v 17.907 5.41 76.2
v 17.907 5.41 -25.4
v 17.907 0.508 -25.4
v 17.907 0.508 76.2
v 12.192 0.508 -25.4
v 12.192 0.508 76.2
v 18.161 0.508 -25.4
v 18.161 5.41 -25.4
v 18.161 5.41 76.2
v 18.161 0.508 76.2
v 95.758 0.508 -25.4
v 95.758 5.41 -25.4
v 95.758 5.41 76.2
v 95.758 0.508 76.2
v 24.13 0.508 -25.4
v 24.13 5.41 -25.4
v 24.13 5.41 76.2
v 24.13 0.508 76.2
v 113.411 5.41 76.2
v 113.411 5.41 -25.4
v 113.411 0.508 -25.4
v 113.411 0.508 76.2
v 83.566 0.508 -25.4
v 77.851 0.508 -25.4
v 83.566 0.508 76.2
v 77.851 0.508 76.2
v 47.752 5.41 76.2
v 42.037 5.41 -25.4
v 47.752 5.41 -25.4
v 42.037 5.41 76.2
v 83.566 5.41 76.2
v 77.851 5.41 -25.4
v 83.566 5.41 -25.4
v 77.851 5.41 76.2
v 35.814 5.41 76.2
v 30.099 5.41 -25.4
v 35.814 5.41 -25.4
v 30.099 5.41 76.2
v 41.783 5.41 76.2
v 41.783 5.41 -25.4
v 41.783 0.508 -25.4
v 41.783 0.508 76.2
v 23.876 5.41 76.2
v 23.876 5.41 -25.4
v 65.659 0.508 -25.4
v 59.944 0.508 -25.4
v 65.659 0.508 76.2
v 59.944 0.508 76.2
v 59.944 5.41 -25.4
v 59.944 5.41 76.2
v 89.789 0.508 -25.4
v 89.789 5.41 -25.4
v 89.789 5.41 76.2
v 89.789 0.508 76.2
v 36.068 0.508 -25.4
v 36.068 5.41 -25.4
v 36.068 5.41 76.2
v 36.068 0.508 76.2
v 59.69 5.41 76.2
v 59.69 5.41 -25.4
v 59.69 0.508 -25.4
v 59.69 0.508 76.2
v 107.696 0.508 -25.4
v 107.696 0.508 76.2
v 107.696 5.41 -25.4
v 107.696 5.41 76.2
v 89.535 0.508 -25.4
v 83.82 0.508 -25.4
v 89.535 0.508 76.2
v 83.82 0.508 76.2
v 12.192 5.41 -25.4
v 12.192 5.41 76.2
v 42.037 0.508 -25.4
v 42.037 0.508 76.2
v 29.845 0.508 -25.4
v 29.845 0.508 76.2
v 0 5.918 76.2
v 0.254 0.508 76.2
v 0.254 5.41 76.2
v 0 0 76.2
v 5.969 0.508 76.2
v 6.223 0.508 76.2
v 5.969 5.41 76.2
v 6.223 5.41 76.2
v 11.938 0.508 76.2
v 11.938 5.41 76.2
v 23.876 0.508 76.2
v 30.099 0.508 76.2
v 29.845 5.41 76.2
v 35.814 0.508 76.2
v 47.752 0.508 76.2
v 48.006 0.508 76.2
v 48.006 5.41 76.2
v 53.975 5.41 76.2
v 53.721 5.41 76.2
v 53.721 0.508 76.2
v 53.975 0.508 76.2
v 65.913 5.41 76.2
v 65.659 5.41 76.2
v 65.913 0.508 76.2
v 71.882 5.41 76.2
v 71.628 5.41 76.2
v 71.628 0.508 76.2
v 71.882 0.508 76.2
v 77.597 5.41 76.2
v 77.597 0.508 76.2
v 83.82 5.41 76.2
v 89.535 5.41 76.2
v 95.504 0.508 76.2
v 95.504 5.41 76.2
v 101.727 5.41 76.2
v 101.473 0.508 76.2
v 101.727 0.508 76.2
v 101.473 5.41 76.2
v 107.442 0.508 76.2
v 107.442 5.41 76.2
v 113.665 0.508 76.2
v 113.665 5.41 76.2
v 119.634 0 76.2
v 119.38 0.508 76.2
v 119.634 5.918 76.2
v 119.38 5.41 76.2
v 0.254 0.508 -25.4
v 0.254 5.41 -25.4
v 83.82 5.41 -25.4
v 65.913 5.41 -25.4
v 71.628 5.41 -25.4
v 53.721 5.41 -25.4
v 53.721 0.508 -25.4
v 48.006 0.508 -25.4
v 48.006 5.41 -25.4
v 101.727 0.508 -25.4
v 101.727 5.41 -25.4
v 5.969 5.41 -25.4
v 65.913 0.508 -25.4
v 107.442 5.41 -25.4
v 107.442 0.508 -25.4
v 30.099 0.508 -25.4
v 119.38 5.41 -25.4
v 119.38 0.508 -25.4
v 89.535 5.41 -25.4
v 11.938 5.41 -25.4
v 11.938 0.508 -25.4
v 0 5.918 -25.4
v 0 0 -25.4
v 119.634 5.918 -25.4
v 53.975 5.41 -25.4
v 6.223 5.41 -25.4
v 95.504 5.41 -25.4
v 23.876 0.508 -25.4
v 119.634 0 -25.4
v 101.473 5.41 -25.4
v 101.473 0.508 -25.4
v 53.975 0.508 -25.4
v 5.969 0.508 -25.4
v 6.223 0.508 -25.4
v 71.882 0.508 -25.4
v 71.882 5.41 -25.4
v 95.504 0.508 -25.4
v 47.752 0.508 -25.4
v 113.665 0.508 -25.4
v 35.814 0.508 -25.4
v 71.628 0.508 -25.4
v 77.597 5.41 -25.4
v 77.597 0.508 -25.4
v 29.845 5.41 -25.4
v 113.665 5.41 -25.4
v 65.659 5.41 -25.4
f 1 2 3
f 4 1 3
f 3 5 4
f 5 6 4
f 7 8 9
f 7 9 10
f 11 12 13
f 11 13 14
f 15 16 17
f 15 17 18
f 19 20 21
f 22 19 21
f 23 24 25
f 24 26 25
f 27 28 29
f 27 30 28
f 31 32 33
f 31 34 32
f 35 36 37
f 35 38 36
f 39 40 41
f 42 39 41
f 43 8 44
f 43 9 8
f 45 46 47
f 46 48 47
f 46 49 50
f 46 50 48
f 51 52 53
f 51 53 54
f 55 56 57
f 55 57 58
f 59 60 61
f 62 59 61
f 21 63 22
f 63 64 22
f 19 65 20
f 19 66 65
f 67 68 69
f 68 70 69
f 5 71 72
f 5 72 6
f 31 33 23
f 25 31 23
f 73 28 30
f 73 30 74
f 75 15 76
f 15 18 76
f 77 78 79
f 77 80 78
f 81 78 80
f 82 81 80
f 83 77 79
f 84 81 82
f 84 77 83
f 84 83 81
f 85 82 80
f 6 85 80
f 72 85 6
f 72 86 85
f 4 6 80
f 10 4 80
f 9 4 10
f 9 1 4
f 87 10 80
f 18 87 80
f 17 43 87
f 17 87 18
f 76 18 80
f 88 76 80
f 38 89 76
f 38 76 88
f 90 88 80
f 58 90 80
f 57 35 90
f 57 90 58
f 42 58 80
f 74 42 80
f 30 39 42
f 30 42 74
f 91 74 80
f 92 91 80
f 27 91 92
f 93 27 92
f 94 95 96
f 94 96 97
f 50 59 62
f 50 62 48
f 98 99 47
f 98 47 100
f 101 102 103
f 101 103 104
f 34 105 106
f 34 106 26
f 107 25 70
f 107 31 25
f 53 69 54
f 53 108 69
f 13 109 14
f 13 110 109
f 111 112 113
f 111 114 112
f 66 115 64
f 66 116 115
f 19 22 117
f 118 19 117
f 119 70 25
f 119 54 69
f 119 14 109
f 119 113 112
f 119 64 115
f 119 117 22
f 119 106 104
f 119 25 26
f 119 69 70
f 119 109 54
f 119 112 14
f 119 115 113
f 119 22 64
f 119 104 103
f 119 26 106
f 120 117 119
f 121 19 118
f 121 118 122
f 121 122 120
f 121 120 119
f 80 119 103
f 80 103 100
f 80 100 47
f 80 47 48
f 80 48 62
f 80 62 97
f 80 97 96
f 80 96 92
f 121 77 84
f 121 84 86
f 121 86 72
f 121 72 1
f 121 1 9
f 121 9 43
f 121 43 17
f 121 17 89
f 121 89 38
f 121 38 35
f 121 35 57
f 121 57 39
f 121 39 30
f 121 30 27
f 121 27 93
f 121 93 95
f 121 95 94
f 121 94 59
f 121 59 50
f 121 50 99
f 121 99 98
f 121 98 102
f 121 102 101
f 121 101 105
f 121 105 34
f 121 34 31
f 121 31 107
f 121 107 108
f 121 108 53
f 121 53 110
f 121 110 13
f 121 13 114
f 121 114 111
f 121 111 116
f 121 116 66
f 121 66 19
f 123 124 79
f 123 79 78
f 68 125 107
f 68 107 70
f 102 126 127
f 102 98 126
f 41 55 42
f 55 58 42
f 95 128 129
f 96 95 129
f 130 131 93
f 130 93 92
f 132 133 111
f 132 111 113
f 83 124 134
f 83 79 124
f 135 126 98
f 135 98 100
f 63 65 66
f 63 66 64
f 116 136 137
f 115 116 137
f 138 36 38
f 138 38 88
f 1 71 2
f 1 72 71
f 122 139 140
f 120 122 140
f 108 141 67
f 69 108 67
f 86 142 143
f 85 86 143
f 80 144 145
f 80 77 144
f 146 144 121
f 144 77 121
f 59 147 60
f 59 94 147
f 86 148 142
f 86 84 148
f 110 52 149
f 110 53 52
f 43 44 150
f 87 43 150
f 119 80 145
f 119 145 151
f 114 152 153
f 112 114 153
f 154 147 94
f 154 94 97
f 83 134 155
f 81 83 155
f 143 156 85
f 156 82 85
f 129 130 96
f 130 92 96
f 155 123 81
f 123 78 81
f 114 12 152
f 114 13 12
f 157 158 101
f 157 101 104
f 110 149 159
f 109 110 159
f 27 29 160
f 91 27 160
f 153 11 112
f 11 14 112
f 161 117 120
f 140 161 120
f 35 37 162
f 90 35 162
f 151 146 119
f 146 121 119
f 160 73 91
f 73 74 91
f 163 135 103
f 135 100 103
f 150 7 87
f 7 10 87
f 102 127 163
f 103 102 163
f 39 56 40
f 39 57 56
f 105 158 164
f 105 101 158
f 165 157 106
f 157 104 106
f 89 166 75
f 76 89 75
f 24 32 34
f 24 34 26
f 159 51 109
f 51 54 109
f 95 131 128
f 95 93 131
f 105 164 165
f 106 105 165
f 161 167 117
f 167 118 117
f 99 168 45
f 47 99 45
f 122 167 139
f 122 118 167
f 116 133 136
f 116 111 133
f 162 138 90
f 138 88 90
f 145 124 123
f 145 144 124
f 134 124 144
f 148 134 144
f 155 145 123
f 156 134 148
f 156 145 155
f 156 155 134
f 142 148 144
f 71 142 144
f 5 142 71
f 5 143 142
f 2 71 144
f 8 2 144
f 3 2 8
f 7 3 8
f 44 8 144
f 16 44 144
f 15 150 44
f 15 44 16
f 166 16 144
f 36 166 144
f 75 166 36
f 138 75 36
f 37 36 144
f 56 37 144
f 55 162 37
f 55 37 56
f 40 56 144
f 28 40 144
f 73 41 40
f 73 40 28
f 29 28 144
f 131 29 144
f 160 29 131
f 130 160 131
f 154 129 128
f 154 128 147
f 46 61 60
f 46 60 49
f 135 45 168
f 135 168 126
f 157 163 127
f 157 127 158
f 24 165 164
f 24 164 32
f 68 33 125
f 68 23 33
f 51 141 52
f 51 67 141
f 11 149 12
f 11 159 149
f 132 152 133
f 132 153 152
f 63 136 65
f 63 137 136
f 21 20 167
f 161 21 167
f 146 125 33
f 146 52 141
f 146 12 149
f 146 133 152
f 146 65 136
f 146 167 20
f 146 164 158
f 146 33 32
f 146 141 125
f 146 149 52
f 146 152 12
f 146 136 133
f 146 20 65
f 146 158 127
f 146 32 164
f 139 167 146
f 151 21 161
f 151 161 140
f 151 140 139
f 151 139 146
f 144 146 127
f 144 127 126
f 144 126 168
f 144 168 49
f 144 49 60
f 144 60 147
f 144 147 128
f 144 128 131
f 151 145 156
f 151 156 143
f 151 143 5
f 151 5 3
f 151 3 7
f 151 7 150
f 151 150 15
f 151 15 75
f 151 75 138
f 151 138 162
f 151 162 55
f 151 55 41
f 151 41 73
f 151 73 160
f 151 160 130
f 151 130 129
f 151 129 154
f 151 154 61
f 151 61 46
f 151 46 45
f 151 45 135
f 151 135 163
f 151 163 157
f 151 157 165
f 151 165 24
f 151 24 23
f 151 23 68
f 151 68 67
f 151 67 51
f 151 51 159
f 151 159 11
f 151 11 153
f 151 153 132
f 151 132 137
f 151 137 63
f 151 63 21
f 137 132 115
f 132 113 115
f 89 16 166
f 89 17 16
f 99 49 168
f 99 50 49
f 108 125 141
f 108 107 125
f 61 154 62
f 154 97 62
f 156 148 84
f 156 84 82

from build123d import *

# Parameters (mm, degrees)
F0_W        = 119.634
F0_H        = 5.9182
F0_W_2      = 5.715
F0_H_2      = 4.9022
F1_DEPTH    = 76.2
F1_FACE_W   = 119.634
F1_FACE_H   = 5.9182
F1_FACE_W_2 = 5.715
F1_FACE_H_2 = 4.9022
F2_DEPTH    = 25.4


with BuildPart() as f1:
    # F0 (on Top) → F1 (new body)
    with BuildSketch(Plane.XY):
        with Locations((59.817, 2.9591)):
            Rectangle(F0_W, F0_H)
        with Locations((3.1115, 2.9591)):
            Rectangle(F0_W_2, F0_H_2, mode=Mode.SUBTRACT)
        with Locations((9.0805, 2.9591)):
            Rectangle(F0_W_2, F0_H_2, mode=Mode.SUBTRACT)
        with Locations((15.0495, 2.9591)):
            Rectangle(F0_W_2, F0_H_2, mode=Mode.SUBTRACT)
        with Locations((21.0185, 2.9591)):
            Rectangle(F0_W_2, F0_H_2, mode=Mode.SUBTRACT)
        with Locations((26.9875, 2.9591)):
            Rectangle(F0_W_2, F0_H_2, mode=Mode.SUBTRACT)
        with Locations((32.9565, 2.9591)):
            Rectangle(F0_W_2, F0_H_2, mode=Mode.SUBTRACT)
        with Locations((38.9255, 2.9591)):
            Rectangle(F0_W_2, F0_H_2, mode=Mode.SUBTRACT)
        with Locations((44.8945, 2.9591)):
            Rectangle(F0_W_2, F0_H_2, mode=Mode.SUBTRACT)
        with Locations((50.8635, 2.9591)):
            Rectangle(F0_W_2, F0_H_2, mode=Mode.SUBTRACT)
        with Locations((56.8325, 2.9591)):
            Rectangle(F0_W_2, F0_H_2, mode=Mode.SUBTRACT)
        with Locations((62.8015, 2.9591)):
            Rectangle(F0_W_2, F0_H_2, mode=Mode.SUBTRACT)
        with Locations((68.7705, 2.9591)):
            Rectangle(F0_W_2, F0_H_2, mode=Mode.SUBTRACT)
        with Locations((74.7395, 2.9591)):
            Rectangle(F0_W_2, F0_H_2, mode=Mode.SUBTRACT)
        with Locations((80.7085, 2.9591)):
            Rectangle(F0_W_2, F0_H_2, mode=Mode.SUBTRACT)
        with Locations((86.6775, 2.9591)):
            Rectangle(F0_W_2, F0_H_2, mode=Mode.SUBTRACT)
        with Locations((92.6465, 2.9591)):
            Rectangle(F0_W_2, F0_H_2, mode=Mode.SUBTRACT)
        with Locations((98.6155, 2.9591)):
            Rectangle(F0_W_2, F0_H_2, mode=Mode.SUBTRACT)
        with Locations((104.5845, 2.9591)):
            Rectangle(F0_W_2, F0_H_2, mode=Mode.SUBTRACT)
        with Locations((110.5535, 2.9591)):
            Rectangle(F0_W_2, F0_H_2, mode=Mode.SUBTRACT)
        with Locations((116.5225, 2.9591)):
            Rectangle(F0_W_2, F0_H_2, mode=Mode.SUBTRACT)
    extrude(amount=F1_DEPTH)

    # F1_face (on face) → F2 (join)
    with BuildSketch(Plane(origin=(59.817, 2.9591, 0), x_dir=(1, 0, 0), z_dir=(0, 0, -1))):
        Rectangle(F1_FACE_W, F1_FACE_H)
        with Locations((-56.7055, 0)):
            Rectangle(F1_FACE_W_2, F1_FACE_H_2, mode=Mode.SUBTRACT)
        with Locations((-50.7365, 0)):
            Rectangle(F1_FACE_W_2, F1_FACE_H_2, mode=Mode.SUBTRACT)
        with Locations((-44.7675, 0)):
            Rectangle(F1_FACE_W_2, F1_FACE_H_2, mode=Mode.SUBTRACT)
        with Locations((-38.7985, 0)):
            Rectangle(F1_FACE_W_2, F1_FACE_H_2, mode=Mode.SUBTRACT)
        with Locations((-32.8295, 0)):
            Rectangle(F1_FACE_W_2, F1_FACE_H_2, mode=Mode.SUBTRACT)
        with Locations((-26.8605, 0)):
            Rectangle(F1_FACE_W_2, F1_FACE_H_2, mode=Mode.SUBTRACT)
        with Locations((-20.8915, 0)):
            Rectangle(F1_FACE_W_2, F1_FACE_H_2, mode=Mode.SUBTRACT)
        with Locations((-14.9225, 0)):
            Rectangle(F1_FACE_W_2, F1_FACE_H_2, mode=Mode.SUBTRACT)
        with Locations((-8.9535, 0)):
            Rectangle(F1_FACE_W_2, F1_FACE_H_2, mode=Mode.SUBTRACT)
        with Locations((-2.9845, 0)):
            Rectangle(F1_FACE_W_2, F1_FACE_H_2, mode=Mode.SUBTRACT)
        with Locations((2.9845, 0)):
            Rectangle(F1_FACE_W_2, F1_FACE_H_2, mode=Mode.SUBTRACT)
        with Locations((8.9535, 0)):
            Rectangle(F1_FACE_W_2, F1_FACE_H_2, mode=Mode.SUBTRACT)
        with Locations((14.9225, 0)):
            Rectangle(F1_FACE_W_2, F1_FACE_H_2, mode=Mode.SUBTRACT)
        with Locations((20.8915, 0)):
            Rectangle(F1_FACE_W_2, F1_FACE_H_2, mode=Mode.SUBTRACT)
        with Locations((26.8605, 0)):
            Rectangle(F1_FACE_W_2, F1_FACE_H_2, mode=Mode.SUBTRACT)
        with Locations((32.8295, 0)):
            Rectangle(F1_FACE_W_2, F1_FACE_H_2, mode=Mode.SUBTRACT)
        with Locations((38.7985, 0)):
            Rectangle(F1_FACE_W_2, F1_FACE_H_2, mode=Mode.SUBTRACT)
        with Locations((44.7675, 0)):
            Rectangle(F1_FACE_W_2, F1_FACE_H_2, mode=Mode.SUBTRACT)
        with Locations((50.7365, 0)):
            Rectangle(F1_FACE_W_2, F1_FACE_H_2, mode=Mode.SUBTRACT)
        with Locations((56.7055, 0)):
            Rectangle(F1_FACE_W_2, F1_FACE_H_2, mode=Mode.SUBTRACT)
    extrude(amount=F2_DEPTH)


solid = f1.part
